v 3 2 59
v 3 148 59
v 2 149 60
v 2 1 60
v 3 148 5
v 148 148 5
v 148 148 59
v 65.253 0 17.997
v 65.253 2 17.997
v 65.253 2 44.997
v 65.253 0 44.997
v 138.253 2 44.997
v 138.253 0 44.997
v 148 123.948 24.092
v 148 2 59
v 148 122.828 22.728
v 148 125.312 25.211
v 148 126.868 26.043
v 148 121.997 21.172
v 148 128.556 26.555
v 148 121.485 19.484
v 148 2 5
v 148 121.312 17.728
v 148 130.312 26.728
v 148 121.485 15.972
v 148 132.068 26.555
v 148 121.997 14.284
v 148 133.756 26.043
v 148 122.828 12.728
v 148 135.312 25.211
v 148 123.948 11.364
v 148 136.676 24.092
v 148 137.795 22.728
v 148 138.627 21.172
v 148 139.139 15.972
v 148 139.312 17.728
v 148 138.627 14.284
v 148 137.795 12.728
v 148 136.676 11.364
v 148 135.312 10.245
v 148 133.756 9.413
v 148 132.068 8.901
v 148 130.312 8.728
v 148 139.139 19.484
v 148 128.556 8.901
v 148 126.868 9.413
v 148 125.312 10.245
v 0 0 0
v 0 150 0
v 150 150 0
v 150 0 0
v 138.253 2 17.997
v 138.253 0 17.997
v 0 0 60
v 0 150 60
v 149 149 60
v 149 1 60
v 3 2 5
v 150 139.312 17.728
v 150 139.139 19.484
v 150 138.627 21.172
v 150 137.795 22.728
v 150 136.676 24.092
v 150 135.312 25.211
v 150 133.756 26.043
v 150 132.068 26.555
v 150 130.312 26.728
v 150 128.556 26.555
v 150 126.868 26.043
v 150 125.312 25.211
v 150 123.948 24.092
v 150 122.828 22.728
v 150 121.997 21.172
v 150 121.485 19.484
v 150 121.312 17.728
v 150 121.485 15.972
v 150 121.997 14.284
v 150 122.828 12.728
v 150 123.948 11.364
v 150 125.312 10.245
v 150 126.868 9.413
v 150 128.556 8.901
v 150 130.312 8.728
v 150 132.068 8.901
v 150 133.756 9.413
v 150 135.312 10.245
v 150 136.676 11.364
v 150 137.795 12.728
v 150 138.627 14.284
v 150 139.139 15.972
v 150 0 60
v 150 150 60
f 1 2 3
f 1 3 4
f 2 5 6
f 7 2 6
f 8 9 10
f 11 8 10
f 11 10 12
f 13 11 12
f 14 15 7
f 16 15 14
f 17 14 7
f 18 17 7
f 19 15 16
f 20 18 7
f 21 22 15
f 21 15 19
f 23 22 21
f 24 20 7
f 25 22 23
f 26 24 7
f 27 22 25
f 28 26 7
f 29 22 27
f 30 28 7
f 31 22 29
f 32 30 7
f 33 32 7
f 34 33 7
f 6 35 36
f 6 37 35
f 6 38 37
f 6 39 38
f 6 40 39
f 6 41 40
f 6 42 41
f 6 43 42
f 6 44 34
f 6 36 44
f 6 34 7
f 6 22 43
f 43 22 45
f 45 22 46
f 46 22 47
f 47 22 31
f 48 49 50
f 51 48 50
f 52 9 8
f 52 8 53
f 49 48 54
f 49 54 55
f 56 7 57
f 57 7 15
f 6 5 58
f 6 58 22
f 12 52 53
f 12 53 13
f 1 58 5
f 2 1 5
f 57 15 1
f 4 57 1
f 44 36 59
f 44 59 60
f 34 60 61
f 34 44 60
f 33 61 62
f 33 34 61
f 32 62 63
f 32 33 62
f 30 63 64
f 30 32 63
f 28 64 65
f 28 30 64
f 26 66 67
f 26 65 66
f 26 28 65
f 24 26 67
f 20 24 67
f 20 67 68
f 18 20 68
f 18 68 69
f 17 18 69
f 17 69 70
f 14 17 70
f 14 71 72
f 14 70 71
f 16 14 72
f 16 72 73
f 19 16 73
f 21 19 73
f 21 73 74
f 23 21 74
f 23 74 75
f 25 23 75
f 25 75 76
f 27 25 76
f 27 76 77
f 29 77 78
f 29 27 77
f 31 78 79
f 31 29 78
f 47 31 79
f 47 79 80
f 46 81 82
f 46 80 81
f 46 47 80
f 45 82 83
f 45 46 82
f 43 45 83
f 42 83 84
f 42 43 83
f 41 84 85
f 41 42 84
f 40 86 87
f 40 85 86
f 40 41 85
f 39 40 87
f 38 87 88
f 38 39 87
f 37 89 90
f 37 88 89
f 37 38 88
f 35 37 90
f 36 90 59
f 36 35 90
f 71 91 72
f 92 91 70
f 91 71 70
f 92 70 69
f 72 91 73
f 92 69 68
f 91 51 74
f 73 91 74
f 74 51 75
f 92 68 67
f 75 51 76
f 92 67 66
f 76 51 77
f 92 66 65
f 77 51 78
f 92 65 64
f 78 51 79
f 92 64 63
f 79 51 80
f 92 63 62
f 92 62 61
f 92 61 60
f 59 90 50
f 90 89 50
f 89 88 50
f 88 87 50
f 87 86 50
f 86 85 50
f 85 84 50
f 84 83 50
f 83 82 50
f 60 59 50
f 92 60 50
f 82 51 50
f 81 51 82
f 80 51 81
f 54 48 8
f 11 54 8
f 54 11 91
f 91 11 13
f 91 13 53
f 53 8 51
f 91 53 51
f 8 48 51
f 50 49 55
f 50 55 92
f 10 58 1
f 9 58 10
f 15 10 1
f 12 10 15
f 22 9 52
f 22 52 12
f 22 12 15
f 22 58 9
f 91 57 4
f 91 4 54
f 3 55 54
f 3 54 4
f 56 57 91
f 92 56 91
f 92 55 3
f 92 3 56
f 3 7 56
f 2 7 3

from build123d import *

# Parameters (mm, degrees)
SKETCH001_R                    = 9
EXTRUDE001_DEPTH               = 10
SKETCH_AS_DRAWN_W              = 73
SKETCH_AS_DRAWN_H              = 27
EXTRUDE_DEPTH                  = 10
EXTRUDE_ONTO_SKETCH_ROLL_ANGLE = 90
BOX_W                          = 145
BOX_H                          = 146
BOX_DEPTH                      = 57
BOX001_W                       = 150
BOX001_H                       = 150
BOX001_DEPTH                   = 60
CHAMFER001_SIZE                = 1


with BuildPart() as conexionalimentacion:
    # Sketch001 → Extrude001 (new body)
    with BuildSketch(Plane.YZ.offset(150)):
        with Locations((129.311707, 12.728212)):
            Circle(SKETCH001_R)
    extrude(amount=EXTRUDE001_DEPTH)


with BuildPart() as conexionalimentacion_1:
    # Extrude001 placement: moved
    add(conexionalimentacion.part.moved(Location((-6, 1, 5))))


with BuildPart() as fusion:
    # Sketch as drawn → Extrude (new)
    with BuildSketch(Plane.XY):
        with Locations((101.75337, 31.497138)):
            Rectangle(SKETCH_AS_DRAWN_W, SKETCH_AS_DRAWN_H)
    extrude(amount=EXTRUDE_DEPTH)


with BuildPart() as fusion_1:
    # Extrude onto Sketch roll: moved
    add(fusion.part.rotate(Axis((0, 0, 0), (1, 0, 0)), EXTRUDE_ONTO_SKETCH_ROLL_ANGLE))


with BuildPart() as fusion_2:
    # Extrude onto Sketch placement: moved
    add(fusion_1.part)


with BuildPart() as fusion_3:
    # Extrude placement: moved
    add(fusion_2.part.moved(Location((0, 6, 0))))

    # Fusion: union ConexionAlimentacion
    add(conexionalimentacion_1.part)


with BuildPart() as cubo:
    # Box → Box (new body)
    with BuildSketch(Plane(origin=(3, 2, 5), x_dir=(1, 0, 0), z_dir=(0, 0, 1))):
        with Locations((72.5, 73)):
            Rectangle(BOX_W, BOX_H)
    extrude(amount=BOX_DEPTH)


with BuildPart() as basecaja:
    # Box001 → Box001 (new body)
    with BuildSketch(Plane.XY):
        with Locations((75, 75)):
            Rectangle(BOX001_W, BOX001_H)
    extrude(amount=BOX001_DEPTH)

    # Cut: cut Cubo
    add(cubo.part, mode=Mode.SUBTRACT)

    # Cut001: cut Fusion
    add(fusion_3.part, mode=Mode.SUBTRACT)

    # Chamfer001
    chamfer001_edges = [basecaja.edges().sort_by_distance(p)[0] for p in [
        (75.5, 2, 60),
        (148, 75, 60),
        (75.5, 148, 60),
        (3, 75, 60),
    ]]
    chamfer(chamfer001_edges, length=CHAMFER001_SIZE)


solid = basecaja.part
